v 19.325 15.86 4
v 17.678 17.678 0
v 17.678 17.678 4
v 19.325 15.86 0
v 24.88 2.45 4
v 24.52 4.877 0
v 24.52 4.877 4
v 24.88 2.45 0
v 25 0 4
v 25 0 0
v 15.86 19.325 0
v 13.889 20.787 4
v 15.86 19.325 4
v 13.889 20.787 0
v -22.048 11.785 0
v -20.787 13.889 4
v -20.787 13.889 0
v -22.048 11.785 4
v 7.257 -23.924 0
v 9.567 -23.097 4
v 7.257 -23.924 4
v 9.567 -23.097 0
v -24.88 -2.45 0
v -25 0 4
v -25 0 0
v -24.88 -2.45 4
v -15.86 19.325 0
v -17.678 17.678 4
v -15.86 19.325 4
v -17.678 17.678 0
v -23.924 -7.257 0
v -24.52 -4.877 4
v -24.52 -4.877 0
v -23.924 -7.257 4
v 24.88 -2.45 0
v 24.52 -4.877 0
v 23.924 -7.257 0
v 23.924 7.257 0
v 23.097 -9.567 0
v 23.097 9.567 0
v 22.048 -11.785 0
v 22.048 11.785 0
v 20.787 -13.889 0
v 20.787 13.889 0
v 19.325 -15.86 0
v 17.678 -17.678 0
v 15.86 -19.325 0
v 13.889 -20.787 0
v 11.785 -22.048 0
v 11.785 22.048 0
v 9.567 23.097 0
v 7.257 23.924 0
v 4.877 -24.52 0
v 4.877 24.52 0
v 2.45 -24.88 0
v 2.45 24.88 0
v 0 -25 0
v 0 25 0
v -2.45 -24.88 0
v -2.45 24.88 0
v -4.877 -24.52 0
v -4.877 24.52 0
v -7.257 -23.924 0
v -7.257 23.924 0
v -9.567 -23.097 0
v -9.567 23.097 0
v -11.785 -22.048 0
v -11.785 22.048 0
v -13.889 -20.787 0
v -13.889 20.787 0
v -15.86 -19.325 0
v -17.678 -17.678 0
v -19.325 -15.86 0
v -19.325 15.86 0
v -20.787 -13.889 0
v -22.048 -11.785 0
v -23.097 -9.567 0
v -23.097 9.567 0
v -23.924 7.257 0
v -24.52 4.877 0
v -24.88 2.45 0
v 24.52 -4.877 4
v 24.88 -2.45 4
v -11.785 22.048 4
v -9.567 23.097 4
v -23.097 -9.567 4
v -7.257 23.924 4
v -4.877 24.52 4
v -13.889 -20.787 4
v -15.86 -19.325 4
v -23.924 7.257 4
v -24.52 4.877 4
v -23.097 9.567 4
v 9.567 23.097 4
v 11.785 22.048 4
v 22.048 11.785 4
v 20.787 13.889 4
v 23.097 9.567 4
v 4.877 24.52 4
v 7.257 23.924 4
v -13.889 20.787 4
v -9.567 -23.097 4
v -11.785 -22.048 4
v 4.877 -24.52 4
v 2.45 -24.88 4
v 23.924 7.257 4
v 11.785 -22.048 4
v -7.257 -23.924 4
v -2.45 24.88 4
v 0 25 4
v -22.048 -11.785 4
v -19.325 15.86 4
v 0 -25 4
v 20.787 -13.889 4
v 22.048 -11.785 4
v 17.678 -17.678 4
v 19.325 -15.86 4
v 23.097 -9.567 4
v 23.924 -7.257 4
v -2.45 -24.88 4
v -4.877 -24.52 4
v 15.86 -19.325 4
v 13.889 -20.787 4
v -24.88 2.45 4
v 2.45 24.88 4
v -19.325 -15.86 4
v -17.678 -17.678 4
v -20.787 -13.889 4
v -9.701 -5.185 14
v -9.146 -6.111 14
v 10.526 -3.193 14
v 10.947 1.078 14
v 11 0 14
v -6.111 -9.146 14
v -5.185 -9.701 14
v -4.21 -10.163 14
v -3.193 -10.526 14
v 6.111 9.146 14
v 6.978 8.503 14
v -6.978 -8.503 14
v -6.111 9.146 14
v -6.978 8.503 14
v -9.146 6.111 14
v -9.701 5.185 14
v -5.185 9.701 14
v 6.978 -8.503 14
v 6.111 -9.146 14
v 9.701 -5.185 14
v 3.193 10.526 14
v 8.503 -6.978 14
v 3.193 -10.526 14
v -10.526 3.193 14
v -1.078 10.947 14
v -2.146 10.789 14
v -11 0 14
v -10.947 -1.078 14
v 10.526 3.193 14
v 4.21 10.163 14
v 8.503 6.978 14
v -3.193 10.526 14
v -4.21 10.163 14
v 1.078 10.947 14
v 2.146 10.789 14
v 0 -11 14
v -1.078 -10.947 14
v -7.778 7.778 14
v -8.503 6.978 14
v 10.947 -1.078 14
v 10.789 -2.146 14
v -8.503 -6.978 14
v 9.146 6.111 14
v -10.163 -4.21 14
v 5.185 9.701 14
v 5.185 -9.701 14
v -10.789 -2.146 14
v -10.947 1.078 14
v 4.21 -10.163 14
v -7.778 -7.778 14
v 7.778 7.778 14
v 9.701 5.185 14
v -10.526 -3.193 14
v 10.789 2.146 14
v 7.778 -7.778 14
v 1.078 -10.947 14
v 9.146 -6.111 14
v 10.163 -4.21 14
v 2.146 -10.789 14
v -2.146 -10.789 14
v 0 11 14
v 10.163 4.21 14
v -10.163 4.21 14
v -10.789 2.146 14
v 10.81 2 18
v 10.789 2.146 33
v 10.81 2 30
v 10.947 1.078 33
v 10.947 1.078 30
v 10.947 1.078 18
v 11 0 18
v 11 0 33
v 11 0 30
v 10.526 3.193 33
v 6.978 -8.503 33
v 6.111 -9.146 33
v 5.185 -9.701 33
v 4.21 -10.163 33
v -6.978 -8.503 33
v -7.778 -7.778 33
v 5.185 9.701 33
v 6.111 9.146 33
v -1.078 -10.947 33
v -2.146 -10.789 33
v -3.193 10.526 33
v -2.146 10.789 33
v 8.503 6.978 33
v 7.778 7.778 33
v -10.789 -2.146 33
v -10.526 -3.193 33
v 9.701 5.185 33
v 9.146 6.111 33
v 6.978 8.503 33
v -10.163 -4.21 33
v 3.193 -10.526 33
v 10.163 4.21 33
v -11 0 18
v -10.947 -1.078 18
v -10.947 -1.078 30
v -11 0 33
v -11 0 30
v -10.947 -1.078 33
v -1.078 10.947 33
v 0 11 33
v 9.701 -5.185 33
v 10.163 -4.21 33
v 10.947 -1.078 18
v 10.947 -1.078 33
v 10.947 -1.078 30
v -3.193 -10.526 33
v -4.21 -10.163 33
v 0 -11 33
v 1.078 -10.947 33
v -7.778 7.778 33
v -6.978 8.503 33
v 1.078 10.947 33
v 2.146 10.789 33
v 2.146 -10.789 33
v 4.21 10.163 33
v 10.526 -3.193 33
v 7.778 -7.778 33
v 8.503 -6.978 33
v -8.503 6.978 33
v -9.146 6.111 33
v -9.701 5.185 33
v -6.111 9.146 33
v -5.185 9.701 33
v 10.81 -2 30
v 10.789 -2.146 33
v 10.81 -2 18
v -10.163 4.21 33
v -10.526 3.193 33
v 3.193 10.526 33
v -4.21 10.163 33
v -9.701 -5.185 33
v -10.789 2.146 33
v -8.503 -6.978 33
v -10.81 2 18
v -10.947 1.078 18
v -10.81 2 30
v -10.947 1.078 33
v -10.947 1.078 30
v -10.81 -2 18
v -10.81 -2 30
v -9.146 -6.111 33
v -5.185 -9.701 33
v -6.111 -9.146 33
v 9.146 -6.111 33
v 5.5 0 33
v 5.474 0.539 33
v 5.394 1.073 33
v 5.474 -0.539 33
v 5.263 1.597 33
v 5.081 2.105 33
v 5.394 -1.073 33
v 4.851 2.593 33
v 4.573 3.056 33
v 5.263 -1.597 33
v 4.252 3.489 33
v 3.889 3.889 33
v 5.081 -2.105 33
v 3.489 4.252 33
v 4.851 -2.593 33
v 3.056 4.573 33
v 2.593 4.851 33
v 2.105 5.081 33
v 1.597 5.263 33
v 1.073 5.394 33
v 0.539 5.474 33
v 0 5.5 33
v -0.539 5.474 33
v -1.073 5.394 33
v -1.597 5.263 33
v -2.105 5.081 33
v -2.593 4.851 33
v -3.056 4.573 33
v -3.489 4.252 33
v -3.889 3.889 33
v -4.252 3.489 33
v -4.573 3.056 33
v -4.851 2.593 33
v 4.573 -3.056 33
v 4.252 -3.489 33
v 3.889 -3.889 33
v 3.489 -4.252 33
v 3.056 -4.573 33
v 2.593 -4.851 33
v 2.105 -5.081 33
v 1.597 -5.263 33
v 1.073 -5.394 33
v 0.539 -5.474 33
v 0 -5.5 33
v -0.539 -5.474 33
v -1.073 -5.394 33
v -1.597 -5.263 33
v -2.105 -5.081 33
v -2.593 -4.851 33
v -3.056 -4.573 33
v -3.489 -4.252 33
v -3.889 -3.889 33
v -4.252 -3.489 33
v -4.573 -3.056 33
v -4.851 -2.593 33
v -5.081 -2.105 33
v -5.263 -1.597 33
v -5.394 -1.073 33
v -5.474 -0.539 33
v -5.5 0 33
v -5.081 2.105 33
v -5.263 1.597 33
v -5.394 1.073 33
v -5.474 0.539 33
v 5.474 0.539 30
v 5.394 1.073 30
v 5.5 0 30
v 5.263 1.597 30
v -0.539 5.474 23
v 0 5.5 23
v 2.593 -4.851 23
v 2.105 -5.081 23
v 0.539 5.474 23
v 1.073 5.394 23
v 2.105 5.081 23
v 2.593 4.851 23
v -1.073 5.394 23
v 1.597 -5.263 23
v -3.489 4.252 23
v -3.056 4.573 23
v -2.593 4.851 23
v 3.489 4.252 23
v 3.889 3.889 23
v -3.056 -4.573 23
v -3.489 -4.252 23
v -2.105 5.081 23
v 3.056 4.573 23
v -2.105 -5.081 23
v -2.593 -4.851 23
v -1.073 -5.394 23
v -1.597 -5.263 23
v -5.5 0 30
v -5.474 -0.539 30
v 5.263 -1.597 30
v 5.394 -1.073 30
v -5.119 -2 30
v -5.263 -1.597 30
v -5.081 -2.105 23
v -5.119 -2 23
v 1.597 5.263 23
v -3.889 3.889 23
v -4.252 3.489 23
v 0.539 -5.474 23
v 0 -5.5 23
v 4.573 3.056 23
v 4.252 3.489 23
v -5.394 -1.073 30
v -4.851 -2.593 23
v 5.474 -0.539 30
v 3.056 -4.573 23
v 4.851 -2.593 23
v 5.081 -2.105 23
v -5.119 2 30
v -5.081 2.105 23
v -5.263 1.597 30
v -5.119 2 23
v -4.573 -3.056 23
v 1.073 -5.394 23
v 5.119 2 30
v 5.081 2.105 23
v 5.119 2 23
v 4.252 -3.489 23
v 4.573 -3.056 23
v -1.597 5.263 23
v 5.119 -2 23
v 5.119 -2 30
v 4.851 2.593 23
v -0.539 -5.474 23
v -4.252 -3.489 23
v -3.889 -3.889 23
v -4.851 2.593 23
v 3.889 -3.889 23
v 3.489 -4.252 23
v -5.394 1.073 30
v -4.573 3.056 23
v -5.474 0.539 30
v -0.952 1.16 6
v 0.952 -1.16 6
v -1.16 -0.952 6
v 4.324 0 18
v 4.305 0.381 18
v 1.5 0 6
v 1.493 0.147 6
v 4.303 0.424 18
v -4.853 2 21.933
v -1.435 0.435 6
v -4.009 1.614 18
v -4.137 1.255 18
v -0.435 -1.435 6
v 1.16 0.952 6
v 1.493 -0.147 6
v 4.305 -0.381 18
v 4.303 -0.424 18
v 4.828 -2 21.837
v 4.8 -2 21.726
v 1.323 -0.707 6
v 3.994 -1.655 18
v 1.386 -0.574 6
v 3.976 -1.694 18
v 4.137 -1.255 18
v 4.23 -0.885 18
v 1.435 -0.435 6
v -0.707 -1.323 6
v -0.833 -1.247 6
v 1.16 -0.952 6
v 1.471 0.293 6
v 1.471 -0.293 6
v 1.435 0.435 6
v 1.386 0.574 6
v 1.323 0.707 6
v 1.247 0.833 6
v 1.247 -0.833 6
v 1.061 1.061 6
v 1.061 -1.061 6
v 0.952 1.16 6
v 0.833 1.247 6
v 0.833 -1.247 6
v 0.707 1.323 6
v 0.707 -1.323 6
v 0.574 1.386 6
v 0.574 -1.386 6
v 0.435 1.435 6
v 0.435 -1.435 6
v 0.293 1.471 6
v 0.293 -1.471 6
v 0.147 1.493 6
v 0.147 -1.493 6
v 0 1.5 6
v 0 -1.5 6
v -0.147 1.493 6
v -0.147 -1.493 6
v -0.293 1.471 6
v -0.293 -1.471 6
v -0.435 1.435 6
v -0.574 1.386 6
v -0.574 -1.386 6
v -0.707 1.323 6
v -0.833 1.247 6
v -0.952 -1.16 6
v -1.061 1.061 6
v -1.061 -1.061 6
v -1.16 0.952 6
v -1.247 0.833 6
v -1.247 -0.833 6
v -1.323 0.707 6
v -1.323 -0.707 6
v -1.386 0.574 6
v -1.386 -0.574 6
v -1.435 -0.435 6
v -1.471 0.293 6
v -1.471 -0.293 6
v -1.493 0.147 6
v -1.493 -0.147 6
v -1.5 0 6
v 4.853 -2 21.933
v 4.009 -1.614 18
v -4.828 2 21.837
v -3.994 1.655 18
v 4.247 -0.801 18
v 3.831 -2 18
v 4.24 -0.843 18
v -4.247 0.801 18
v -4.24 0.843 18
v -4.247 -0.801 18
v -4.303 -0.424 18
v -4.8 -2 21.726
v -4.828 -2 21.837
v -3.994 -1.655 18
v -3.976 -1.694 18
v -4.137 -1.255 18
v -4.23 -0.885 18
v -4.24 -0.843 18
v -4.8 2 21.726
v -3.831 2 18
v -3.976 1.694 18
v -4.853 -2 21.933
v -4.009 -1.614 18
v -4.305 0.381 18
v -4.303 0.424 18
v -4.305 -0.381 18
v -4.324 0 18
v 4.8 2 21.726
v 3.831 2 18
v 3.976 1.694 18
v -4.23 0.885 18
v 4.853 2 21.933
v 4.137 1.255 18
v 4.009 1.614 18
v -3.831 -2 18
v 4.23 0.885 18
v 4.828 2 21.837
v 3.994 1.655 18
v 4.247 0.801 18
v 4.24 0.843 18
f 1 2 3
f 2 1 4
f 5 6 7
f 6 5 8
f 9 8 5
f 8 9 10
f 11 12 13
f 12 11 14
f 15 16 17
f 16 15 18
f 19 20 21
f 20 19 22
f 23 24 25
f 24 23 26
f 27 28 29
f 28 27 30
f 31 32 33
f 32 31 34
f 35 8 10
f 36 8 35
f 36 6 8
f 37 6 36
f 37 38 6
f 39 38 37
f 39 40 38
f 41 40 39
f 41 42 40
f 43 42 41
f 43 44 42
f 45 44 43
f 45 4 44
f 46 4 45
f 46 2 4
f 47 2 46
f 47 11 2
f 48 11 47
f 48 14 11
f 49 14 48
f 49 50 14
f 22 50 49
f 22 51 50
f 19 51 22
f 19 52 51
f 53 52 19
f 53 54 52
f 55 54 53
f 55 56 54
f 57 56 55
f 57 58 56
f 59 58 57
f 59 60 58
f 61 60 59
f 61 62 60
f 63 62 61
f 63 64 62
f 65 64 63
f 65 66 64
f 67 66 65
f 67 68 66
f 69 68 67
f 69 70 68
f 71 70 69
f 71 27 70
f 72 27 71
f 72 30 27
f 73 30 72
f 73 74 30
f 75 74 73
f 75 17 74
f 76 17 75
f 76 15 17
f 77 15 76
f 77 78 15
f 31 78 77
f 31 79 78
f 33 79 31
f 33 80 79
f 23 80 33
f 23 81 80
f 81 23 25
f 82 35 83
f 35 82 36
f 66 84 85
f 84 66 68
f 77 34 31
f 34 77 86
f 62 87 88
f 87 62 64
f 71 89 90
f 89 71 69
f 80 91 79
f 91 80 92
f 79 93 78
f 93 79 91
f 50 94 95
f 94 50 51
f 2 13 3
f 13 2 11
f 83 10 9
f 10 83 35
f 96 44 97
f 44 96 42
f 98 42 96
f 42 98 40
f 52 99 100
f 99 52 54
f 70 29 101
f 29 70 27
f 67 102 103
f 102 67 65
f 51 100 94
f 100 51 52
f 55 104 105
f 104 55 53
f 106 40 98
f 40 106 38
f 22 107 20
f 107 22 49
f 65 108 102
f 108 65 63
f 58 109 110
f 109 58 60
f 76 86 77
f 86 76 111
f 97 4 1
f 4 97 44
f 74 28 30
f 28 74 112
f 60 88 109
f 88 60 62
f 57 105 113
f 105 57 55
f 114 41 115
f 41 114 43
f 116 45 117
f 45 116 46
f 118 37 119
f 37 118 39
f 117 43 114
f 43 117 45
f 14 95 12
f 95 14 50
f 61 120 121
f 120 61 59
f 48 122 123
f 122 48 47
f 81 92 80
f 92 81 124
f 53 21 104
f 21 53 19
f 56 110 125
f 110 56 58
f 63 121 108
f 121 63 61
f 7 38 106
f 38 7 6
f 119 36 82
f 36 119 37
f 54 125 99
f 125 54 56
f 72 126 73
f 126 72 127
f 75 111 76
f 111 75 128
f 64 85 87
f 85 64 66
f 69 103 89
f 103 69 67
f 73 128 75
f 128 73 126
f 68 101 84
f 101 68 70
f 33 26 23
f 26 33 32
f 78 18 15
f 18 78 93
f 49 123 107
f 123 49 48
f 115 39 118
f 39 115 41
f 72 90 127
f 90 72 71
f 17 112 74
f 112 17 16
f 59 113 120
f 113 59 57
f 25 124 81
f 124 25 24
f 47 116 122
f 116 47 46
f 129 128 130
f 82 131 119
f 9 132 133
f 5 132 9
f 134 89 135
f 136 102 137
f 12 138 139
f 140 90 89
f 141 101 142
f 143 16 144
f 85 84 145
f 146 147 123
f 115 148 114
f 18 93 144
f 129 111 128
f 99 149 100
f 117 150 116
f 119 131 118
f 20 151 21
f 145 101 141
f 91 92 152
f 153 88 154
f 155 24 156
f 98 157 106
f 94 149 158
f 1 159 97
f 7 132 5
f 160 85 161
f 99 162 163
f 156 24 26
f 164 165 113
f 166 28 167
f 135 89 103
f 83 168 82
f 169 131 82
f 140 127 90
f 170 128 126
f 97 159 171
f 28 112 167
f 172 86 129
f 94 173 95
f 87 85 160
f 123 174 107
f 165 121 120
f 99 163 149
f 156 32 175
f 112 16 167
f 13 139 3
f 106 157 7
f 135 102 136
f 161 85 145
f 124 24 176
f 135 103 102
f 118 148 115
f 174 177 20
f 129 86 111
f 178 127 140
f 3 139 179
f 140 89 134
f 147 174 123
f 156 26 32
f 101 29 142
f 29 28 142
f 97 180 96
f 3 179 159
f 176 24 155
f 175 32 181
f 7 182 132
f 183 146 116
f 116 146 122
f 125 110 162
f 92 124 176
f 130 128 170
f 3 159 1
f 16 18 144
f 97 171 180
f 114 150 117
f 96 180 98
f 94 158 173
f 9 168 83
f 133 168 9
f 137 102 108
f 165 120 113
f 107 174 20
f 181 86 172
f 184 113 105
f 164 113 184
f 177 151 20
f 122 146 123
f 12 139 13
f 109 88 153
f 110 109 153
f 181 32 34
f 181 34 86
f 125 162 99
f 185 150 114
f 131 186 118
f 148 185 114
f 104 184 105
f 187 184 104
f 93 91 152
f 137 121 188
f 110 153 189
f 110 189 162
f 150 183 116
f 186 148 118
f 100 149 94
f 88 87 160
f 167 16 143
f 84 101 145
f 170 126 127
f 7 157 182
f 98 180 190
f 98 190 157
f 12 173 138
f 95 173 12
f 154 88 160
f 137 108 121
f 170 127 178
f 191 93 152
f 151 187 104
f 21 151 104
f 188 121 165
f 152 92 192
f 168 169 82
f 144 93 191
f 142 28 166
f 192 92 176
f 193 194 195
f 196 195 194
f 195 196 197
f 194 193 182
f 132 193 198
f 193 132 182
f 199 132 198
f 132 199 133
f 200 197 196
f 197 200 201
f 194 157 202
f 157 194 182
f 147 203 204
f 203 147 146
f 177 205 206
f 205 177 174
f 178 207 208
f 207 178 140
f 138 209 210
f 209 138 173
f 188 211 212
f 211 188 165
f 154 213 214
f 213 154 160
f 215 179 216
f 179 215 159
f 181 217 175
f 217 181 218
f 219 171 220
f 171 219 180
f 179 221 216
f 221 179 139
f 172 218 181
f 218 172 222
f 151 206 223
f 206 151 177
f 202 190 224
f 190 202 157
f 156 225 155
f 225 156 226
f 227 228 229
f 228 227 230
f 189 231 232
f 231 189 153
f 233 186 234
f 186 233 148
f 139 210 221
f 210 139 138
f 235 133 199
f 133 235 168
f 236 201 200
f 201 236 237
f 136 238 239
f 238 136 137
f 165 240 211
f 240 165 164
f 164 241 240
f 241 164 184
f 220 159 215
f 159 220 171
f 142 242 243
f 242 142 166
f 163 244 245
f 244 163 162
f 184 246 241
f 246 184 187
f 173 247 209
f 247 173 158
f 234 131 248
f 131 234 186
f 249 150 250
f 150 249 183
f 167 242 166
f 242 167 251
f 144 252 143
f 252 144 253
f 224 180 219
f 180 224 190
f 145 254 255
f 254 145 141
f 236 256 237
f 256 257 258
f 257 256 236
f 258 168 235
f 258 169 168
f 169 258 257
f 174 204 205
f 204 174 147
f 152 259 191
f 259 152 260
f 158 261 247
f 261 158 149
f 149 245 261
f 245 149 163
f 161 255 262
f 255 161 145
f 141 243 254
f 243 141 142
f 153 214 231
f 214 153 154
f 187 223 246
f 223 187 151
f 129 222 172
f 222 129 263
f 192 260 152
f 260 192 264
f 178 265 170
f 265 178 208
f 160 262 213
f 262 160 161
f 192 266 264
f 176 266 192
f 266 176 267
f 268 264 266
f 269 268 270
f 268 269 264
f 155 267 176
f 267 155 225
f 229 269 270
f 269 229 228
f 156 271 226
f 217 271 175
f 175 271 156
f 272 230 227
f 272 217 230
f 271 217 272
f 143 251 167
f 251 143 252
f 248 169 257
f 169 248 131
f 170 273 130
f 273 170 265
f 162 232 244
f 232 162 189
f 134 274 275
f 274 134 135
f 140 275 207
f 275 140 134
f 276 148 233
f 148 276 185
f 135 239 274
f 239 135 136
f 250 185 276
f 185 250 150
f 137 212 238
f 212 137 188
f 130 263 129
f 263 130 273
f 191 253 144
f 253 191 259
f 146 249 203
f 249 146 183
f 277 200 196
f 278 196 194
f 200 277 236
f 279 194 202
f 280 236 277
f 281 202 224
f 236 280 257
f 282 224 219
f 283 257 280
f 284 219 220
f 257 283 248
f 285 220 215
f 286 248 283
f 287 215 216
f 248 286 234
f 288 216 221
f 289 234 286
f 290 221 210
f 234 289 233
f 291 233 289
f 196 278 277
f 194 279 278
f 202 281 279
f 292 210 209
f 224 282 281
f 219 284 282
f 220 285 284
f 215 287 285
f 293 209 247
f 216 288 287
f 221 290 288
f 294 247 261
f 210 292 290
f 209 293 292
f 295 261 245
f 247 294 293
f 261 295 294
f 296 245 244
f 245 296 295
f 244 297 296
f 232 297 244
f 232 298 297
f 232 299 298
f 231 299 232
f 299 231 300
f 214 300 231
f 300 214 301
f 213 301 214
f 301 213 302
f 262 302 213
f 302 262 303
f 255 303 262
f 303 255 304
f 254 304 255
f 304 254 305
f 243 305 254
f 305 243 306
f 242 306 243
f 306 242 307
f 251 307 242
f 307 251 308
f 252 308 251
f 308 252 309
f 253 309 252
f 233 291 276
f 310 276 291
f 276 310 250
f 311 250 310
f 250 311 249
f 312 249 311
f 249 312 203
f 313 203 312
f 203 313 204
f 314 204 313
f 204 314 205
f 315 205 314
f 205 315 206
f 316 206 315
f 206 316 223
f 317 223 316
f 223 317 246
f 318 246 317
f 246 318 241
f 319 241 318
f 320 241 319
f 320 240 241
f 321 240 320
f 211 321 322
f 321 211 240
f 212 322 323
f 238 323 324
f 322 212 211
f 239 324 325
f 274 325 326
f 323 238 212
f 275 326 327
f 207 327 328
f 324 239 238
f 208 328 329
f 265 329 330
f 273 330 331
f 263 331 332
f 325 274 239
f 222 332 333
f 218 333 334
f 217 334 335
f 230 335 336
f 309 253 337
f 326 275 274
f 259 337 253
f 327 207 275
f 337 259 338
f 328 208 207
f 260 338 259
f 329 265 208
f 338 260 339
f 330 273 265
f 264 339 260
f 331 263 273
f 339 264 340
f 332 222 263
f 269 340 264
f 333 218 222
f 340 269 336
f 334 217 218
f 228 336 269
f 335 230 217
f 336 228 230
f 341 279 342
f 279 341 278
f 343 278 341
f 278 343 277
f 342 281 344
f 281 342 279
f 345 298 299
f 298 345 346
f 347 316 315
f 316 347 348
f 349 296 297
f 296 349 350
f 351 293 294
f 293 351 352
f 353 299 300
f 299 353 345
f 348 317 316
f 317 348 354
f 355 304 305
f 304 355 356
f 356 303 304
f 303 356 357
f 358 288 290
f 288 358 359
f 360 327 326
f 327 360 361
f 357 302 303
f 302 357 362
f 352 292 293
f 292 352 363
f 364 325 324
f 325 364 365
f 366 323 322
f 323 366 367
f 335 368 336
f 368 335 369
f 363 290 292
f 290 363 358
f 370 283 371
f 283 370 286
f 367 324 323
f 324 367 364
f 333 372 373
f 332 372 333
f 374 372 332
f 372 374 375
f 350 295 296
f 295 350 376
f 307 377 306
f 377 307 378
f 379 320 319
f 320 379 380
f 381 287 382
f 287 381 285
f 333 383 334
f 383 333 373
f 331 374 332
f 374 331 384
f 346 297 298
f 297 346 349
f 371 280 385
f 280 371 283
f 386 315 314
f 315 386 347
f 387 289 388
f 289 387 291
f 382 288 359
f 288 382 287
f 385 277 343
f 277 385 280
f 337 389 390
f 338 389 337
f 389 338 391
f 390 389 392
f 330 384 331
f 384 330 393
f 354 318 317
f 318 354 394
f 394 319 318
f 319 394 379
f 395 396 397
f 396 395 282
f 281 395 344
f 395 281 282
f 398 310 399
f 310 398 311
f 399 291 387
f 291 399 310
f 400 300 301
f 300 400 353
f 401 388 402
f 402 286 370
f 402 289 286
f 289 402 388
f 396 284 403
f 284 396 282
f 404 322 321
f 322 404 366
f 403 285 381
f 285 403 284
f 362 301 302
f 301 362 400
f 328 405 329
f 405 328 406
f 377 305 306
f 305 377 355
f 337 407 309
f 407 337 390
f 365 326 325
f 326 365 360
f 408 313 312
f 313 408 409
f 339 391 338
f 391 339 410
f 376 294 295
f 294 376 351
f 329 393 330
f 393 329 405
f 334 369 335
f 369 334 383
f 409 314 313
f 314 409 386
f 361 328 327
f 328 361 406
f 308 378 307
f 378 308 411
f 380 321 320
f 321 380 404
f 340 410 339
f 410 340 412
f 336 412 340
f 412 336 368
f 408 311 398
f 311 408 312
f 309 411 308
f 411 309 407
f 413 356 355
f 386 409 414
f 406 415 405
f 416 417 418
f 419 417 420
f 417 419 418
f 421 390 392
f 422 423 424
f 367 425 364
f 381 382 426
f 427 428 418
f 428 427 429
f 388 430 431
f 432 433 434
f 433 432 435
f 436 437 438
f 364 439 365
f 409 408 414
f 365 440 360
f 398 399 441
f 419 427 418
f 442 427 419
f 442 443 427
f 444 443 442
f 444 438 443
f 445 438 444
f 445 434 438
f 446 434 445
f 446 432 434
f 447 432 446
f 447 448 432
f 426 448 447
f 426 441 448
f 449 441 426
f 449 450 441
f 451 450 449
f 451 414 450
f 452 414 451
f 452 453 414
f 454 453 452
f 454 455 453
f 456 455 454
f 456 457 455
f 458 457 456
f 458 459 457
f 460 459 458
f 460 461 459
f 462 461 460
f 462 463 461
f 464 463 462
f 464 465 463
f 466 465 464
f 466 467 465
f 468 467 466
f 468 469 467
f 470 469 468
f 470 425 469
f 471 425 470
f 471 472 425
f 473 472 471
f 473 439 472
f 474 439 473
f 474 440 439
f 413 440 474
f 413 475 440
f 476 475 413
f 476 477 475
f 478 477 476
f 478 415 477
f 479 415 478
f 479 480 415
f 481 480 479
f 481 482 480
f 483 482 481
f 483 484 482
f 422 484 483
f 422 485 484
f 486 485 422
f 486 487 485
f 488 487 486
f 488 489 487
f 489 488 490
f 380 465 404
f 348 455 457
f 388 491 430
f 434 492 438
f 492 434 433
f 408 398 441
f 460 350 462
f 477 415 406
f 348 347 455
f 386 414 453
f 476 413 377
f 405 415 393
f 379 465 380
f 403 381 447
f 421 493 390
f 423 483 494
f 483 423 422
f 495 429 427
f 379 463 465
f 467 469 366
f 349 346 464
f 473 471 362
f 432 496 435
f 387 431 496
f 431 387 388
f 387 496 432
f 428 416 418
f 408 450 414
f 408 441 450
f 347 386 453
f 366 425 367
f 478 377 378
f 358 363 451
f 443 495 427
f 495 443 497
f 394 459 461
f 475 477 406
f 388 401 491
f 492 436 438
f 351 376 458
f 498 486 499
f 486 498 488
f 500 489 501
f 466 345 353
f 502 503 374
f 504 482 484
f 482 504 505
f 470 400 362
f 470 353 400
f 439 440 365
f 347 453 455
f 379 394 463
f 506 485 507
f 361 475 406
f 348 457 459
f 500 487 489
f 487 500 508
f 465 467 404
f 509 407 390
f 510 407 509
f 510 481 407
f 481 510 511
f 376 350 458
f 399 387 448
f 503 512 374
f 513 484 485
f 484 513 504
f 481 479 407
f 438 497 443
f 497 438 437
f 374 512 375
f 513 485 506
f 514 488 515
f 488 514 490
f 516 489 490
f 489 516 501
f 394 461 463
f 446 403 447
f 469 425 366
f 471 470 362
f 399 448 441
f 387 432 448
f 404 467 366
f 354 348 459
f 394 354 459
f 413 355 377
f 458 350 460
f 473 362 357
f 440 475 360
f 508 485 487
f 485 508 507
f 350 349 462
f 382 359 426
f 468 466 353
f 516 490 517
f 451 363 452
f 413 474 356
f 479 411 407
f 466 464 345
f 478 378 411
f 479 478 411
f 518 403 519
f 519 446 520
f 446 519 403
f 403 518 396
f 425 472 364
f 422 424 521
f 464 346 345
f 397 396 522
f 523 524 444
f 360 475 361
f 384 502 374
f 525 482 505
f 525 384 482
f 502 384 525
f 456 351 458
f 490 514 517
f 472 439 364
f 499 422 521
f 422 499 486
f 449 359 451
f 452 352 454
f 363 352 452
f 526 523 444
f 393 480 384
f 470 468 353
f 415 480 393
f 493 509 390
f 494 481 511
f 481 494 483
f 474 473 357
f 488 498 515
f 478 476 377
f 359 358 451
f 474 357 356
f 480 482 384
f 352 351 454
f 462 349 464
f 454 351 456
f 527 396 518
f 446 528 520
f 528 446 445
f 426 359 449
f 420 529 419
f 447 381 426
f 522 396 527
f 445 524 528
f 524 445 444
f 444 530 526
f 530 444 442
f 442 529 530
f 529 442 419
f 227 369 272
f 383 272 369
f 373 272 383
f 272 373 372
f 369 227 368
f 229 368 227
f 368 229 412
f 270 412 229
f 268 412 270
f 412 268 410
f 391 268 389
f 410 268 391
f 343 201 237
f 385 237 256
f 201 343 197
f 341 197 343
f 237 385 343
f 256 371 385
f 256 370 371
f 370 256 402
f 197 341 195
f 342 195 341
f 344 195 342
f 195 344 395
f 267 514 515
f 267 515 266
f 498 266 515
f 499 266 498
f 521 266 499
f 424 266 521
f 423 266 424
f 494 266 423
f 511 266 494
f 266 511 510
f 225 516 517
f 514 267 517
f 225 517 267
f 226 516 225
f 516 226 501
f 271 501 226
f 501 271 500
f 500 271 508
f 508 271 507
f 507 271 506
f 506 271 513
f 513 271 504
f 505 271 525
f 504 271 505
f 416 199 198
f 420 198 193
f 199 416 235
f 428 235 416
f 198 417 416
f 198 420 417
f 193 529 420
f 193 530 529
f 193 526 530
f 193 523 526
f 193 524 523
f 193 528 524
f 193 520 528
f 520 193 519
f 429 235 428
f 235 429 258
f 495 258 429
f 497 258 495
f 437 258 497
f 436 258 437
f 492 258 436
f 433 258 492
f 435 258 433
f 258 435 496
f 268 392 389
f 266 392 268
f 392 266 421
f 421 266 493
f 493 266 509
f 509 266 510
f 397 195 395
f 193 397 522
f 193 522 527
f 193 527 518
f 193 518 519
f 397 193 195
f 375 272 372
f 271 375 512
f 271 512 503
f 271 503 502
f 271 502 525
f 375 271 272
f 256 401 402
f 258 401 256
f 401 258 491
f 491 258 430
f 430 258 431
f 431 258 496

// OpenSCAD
// Stand for a 1.5 mL microcentrifuge tube, printed standing up.
// All dimensions in millimetres, measured with calipers.

$fn = 64;

// Base disc
base_d = 50;      // base disc diameter
base_h = 4;       // base disc height (z = 0 to 4)

// Cone (base to column)
cone_top_d = 22;  // cone top diameter (at z = 14)
cone_z0 = 4;      // cone starts at z = 4
cone_z1 = 14;     // cone ends at z = 14

// Column
col_d = 22;       // column diameter
col_z0 = 14;      // column starts at z = 14
col_z1 = 33;      // column ends at z = 33 (top)

// Tube seat (bore from the top)
seat_d = 11;      // seat diameter (z = 33 down to 23)
seat_z0 = 23;     // seat bottom (z = 23)
seat_z1 = 33;     // seat top (z = 33, open at top)

// Tip cone (follows the tube's conical tip)
tip_top_d = 11;   // tip cone top diameter (at z = 23)
tip_bot_d = 3;    // tip cone bottom diameter (at z = 6)
tip_z0 = 6;       // tip cone bottom (z = 6)
tip_z1 = 23;      // tip cone top (z = 23)

// Viewing window (cut through the +X column wall)
win_w = 4;       // window width in Y
win_z0 = 18;     // window bottom (z = 18)
win_z1 = 30;     // window top (z = 30)

// ------------------------------------------------------------------
// Build the solid stand (base + cone + column), then subtract the
// tube seat and the viewing window.
// ------------------------------------------------------------------

// Base disc: 50 mm diameter, z = 0 to 4
module base() { translate([0, 0, 0])
    cylinder(h = base_h, d = base_d, $fn = $fn); }

// Cone: 50 mm at z = 4 narrowing to 22 mm at z = 14
module cone() { translate([0, 0, cone_z0])
    cylinder(h = cone_z1 - cone_z0, d1 = base_d, d2 = cone_top_d, $fn = $fn); }

// Column: 22 mm diameter, z = 14 to 33
module column() { translate([0, 0, col_z0])
    cylinder(h = col_z1 - col_z0, d = col_d, $fn = $fn); }

// Tube seat: 11 mm bore from z = 33 down to z = 23
module seat() { translate([0, 0, seat_z0])
    cylinder(h = seat_z1 - seat_z0, d = seat_d, $fn = $fn); }

// Tip cone: 11 mm at z = 23 narrowing to 3 mm at z = 6
module tip() { translate([0, 0, tip_z0])
    cylinder(h = tip_z1 - tip_z0, d1 = tip_bot_d, d2 = tip_top_d, $fn = $fn); }

// Viewing window: 4 mm wide in Y, cut straight through the +X wall
// from the seat to the outside, between z = 18 and z = 30.
// The box extends past the +X face (x = 11) and past the -X face
// (x = -11) so the cut is clean; it is centred in Y and spans the
// full Z range of the window.
module window() { translate([-11.01, -win_w/2, win_z0])
    cube([22.02, win_w, win_z1 - win_z0]); }

// Final part
difference() {
    union() {
        base();
        cone();
        column();
    }
    union() {
        seat();
        tip();
    }
    window();
}
